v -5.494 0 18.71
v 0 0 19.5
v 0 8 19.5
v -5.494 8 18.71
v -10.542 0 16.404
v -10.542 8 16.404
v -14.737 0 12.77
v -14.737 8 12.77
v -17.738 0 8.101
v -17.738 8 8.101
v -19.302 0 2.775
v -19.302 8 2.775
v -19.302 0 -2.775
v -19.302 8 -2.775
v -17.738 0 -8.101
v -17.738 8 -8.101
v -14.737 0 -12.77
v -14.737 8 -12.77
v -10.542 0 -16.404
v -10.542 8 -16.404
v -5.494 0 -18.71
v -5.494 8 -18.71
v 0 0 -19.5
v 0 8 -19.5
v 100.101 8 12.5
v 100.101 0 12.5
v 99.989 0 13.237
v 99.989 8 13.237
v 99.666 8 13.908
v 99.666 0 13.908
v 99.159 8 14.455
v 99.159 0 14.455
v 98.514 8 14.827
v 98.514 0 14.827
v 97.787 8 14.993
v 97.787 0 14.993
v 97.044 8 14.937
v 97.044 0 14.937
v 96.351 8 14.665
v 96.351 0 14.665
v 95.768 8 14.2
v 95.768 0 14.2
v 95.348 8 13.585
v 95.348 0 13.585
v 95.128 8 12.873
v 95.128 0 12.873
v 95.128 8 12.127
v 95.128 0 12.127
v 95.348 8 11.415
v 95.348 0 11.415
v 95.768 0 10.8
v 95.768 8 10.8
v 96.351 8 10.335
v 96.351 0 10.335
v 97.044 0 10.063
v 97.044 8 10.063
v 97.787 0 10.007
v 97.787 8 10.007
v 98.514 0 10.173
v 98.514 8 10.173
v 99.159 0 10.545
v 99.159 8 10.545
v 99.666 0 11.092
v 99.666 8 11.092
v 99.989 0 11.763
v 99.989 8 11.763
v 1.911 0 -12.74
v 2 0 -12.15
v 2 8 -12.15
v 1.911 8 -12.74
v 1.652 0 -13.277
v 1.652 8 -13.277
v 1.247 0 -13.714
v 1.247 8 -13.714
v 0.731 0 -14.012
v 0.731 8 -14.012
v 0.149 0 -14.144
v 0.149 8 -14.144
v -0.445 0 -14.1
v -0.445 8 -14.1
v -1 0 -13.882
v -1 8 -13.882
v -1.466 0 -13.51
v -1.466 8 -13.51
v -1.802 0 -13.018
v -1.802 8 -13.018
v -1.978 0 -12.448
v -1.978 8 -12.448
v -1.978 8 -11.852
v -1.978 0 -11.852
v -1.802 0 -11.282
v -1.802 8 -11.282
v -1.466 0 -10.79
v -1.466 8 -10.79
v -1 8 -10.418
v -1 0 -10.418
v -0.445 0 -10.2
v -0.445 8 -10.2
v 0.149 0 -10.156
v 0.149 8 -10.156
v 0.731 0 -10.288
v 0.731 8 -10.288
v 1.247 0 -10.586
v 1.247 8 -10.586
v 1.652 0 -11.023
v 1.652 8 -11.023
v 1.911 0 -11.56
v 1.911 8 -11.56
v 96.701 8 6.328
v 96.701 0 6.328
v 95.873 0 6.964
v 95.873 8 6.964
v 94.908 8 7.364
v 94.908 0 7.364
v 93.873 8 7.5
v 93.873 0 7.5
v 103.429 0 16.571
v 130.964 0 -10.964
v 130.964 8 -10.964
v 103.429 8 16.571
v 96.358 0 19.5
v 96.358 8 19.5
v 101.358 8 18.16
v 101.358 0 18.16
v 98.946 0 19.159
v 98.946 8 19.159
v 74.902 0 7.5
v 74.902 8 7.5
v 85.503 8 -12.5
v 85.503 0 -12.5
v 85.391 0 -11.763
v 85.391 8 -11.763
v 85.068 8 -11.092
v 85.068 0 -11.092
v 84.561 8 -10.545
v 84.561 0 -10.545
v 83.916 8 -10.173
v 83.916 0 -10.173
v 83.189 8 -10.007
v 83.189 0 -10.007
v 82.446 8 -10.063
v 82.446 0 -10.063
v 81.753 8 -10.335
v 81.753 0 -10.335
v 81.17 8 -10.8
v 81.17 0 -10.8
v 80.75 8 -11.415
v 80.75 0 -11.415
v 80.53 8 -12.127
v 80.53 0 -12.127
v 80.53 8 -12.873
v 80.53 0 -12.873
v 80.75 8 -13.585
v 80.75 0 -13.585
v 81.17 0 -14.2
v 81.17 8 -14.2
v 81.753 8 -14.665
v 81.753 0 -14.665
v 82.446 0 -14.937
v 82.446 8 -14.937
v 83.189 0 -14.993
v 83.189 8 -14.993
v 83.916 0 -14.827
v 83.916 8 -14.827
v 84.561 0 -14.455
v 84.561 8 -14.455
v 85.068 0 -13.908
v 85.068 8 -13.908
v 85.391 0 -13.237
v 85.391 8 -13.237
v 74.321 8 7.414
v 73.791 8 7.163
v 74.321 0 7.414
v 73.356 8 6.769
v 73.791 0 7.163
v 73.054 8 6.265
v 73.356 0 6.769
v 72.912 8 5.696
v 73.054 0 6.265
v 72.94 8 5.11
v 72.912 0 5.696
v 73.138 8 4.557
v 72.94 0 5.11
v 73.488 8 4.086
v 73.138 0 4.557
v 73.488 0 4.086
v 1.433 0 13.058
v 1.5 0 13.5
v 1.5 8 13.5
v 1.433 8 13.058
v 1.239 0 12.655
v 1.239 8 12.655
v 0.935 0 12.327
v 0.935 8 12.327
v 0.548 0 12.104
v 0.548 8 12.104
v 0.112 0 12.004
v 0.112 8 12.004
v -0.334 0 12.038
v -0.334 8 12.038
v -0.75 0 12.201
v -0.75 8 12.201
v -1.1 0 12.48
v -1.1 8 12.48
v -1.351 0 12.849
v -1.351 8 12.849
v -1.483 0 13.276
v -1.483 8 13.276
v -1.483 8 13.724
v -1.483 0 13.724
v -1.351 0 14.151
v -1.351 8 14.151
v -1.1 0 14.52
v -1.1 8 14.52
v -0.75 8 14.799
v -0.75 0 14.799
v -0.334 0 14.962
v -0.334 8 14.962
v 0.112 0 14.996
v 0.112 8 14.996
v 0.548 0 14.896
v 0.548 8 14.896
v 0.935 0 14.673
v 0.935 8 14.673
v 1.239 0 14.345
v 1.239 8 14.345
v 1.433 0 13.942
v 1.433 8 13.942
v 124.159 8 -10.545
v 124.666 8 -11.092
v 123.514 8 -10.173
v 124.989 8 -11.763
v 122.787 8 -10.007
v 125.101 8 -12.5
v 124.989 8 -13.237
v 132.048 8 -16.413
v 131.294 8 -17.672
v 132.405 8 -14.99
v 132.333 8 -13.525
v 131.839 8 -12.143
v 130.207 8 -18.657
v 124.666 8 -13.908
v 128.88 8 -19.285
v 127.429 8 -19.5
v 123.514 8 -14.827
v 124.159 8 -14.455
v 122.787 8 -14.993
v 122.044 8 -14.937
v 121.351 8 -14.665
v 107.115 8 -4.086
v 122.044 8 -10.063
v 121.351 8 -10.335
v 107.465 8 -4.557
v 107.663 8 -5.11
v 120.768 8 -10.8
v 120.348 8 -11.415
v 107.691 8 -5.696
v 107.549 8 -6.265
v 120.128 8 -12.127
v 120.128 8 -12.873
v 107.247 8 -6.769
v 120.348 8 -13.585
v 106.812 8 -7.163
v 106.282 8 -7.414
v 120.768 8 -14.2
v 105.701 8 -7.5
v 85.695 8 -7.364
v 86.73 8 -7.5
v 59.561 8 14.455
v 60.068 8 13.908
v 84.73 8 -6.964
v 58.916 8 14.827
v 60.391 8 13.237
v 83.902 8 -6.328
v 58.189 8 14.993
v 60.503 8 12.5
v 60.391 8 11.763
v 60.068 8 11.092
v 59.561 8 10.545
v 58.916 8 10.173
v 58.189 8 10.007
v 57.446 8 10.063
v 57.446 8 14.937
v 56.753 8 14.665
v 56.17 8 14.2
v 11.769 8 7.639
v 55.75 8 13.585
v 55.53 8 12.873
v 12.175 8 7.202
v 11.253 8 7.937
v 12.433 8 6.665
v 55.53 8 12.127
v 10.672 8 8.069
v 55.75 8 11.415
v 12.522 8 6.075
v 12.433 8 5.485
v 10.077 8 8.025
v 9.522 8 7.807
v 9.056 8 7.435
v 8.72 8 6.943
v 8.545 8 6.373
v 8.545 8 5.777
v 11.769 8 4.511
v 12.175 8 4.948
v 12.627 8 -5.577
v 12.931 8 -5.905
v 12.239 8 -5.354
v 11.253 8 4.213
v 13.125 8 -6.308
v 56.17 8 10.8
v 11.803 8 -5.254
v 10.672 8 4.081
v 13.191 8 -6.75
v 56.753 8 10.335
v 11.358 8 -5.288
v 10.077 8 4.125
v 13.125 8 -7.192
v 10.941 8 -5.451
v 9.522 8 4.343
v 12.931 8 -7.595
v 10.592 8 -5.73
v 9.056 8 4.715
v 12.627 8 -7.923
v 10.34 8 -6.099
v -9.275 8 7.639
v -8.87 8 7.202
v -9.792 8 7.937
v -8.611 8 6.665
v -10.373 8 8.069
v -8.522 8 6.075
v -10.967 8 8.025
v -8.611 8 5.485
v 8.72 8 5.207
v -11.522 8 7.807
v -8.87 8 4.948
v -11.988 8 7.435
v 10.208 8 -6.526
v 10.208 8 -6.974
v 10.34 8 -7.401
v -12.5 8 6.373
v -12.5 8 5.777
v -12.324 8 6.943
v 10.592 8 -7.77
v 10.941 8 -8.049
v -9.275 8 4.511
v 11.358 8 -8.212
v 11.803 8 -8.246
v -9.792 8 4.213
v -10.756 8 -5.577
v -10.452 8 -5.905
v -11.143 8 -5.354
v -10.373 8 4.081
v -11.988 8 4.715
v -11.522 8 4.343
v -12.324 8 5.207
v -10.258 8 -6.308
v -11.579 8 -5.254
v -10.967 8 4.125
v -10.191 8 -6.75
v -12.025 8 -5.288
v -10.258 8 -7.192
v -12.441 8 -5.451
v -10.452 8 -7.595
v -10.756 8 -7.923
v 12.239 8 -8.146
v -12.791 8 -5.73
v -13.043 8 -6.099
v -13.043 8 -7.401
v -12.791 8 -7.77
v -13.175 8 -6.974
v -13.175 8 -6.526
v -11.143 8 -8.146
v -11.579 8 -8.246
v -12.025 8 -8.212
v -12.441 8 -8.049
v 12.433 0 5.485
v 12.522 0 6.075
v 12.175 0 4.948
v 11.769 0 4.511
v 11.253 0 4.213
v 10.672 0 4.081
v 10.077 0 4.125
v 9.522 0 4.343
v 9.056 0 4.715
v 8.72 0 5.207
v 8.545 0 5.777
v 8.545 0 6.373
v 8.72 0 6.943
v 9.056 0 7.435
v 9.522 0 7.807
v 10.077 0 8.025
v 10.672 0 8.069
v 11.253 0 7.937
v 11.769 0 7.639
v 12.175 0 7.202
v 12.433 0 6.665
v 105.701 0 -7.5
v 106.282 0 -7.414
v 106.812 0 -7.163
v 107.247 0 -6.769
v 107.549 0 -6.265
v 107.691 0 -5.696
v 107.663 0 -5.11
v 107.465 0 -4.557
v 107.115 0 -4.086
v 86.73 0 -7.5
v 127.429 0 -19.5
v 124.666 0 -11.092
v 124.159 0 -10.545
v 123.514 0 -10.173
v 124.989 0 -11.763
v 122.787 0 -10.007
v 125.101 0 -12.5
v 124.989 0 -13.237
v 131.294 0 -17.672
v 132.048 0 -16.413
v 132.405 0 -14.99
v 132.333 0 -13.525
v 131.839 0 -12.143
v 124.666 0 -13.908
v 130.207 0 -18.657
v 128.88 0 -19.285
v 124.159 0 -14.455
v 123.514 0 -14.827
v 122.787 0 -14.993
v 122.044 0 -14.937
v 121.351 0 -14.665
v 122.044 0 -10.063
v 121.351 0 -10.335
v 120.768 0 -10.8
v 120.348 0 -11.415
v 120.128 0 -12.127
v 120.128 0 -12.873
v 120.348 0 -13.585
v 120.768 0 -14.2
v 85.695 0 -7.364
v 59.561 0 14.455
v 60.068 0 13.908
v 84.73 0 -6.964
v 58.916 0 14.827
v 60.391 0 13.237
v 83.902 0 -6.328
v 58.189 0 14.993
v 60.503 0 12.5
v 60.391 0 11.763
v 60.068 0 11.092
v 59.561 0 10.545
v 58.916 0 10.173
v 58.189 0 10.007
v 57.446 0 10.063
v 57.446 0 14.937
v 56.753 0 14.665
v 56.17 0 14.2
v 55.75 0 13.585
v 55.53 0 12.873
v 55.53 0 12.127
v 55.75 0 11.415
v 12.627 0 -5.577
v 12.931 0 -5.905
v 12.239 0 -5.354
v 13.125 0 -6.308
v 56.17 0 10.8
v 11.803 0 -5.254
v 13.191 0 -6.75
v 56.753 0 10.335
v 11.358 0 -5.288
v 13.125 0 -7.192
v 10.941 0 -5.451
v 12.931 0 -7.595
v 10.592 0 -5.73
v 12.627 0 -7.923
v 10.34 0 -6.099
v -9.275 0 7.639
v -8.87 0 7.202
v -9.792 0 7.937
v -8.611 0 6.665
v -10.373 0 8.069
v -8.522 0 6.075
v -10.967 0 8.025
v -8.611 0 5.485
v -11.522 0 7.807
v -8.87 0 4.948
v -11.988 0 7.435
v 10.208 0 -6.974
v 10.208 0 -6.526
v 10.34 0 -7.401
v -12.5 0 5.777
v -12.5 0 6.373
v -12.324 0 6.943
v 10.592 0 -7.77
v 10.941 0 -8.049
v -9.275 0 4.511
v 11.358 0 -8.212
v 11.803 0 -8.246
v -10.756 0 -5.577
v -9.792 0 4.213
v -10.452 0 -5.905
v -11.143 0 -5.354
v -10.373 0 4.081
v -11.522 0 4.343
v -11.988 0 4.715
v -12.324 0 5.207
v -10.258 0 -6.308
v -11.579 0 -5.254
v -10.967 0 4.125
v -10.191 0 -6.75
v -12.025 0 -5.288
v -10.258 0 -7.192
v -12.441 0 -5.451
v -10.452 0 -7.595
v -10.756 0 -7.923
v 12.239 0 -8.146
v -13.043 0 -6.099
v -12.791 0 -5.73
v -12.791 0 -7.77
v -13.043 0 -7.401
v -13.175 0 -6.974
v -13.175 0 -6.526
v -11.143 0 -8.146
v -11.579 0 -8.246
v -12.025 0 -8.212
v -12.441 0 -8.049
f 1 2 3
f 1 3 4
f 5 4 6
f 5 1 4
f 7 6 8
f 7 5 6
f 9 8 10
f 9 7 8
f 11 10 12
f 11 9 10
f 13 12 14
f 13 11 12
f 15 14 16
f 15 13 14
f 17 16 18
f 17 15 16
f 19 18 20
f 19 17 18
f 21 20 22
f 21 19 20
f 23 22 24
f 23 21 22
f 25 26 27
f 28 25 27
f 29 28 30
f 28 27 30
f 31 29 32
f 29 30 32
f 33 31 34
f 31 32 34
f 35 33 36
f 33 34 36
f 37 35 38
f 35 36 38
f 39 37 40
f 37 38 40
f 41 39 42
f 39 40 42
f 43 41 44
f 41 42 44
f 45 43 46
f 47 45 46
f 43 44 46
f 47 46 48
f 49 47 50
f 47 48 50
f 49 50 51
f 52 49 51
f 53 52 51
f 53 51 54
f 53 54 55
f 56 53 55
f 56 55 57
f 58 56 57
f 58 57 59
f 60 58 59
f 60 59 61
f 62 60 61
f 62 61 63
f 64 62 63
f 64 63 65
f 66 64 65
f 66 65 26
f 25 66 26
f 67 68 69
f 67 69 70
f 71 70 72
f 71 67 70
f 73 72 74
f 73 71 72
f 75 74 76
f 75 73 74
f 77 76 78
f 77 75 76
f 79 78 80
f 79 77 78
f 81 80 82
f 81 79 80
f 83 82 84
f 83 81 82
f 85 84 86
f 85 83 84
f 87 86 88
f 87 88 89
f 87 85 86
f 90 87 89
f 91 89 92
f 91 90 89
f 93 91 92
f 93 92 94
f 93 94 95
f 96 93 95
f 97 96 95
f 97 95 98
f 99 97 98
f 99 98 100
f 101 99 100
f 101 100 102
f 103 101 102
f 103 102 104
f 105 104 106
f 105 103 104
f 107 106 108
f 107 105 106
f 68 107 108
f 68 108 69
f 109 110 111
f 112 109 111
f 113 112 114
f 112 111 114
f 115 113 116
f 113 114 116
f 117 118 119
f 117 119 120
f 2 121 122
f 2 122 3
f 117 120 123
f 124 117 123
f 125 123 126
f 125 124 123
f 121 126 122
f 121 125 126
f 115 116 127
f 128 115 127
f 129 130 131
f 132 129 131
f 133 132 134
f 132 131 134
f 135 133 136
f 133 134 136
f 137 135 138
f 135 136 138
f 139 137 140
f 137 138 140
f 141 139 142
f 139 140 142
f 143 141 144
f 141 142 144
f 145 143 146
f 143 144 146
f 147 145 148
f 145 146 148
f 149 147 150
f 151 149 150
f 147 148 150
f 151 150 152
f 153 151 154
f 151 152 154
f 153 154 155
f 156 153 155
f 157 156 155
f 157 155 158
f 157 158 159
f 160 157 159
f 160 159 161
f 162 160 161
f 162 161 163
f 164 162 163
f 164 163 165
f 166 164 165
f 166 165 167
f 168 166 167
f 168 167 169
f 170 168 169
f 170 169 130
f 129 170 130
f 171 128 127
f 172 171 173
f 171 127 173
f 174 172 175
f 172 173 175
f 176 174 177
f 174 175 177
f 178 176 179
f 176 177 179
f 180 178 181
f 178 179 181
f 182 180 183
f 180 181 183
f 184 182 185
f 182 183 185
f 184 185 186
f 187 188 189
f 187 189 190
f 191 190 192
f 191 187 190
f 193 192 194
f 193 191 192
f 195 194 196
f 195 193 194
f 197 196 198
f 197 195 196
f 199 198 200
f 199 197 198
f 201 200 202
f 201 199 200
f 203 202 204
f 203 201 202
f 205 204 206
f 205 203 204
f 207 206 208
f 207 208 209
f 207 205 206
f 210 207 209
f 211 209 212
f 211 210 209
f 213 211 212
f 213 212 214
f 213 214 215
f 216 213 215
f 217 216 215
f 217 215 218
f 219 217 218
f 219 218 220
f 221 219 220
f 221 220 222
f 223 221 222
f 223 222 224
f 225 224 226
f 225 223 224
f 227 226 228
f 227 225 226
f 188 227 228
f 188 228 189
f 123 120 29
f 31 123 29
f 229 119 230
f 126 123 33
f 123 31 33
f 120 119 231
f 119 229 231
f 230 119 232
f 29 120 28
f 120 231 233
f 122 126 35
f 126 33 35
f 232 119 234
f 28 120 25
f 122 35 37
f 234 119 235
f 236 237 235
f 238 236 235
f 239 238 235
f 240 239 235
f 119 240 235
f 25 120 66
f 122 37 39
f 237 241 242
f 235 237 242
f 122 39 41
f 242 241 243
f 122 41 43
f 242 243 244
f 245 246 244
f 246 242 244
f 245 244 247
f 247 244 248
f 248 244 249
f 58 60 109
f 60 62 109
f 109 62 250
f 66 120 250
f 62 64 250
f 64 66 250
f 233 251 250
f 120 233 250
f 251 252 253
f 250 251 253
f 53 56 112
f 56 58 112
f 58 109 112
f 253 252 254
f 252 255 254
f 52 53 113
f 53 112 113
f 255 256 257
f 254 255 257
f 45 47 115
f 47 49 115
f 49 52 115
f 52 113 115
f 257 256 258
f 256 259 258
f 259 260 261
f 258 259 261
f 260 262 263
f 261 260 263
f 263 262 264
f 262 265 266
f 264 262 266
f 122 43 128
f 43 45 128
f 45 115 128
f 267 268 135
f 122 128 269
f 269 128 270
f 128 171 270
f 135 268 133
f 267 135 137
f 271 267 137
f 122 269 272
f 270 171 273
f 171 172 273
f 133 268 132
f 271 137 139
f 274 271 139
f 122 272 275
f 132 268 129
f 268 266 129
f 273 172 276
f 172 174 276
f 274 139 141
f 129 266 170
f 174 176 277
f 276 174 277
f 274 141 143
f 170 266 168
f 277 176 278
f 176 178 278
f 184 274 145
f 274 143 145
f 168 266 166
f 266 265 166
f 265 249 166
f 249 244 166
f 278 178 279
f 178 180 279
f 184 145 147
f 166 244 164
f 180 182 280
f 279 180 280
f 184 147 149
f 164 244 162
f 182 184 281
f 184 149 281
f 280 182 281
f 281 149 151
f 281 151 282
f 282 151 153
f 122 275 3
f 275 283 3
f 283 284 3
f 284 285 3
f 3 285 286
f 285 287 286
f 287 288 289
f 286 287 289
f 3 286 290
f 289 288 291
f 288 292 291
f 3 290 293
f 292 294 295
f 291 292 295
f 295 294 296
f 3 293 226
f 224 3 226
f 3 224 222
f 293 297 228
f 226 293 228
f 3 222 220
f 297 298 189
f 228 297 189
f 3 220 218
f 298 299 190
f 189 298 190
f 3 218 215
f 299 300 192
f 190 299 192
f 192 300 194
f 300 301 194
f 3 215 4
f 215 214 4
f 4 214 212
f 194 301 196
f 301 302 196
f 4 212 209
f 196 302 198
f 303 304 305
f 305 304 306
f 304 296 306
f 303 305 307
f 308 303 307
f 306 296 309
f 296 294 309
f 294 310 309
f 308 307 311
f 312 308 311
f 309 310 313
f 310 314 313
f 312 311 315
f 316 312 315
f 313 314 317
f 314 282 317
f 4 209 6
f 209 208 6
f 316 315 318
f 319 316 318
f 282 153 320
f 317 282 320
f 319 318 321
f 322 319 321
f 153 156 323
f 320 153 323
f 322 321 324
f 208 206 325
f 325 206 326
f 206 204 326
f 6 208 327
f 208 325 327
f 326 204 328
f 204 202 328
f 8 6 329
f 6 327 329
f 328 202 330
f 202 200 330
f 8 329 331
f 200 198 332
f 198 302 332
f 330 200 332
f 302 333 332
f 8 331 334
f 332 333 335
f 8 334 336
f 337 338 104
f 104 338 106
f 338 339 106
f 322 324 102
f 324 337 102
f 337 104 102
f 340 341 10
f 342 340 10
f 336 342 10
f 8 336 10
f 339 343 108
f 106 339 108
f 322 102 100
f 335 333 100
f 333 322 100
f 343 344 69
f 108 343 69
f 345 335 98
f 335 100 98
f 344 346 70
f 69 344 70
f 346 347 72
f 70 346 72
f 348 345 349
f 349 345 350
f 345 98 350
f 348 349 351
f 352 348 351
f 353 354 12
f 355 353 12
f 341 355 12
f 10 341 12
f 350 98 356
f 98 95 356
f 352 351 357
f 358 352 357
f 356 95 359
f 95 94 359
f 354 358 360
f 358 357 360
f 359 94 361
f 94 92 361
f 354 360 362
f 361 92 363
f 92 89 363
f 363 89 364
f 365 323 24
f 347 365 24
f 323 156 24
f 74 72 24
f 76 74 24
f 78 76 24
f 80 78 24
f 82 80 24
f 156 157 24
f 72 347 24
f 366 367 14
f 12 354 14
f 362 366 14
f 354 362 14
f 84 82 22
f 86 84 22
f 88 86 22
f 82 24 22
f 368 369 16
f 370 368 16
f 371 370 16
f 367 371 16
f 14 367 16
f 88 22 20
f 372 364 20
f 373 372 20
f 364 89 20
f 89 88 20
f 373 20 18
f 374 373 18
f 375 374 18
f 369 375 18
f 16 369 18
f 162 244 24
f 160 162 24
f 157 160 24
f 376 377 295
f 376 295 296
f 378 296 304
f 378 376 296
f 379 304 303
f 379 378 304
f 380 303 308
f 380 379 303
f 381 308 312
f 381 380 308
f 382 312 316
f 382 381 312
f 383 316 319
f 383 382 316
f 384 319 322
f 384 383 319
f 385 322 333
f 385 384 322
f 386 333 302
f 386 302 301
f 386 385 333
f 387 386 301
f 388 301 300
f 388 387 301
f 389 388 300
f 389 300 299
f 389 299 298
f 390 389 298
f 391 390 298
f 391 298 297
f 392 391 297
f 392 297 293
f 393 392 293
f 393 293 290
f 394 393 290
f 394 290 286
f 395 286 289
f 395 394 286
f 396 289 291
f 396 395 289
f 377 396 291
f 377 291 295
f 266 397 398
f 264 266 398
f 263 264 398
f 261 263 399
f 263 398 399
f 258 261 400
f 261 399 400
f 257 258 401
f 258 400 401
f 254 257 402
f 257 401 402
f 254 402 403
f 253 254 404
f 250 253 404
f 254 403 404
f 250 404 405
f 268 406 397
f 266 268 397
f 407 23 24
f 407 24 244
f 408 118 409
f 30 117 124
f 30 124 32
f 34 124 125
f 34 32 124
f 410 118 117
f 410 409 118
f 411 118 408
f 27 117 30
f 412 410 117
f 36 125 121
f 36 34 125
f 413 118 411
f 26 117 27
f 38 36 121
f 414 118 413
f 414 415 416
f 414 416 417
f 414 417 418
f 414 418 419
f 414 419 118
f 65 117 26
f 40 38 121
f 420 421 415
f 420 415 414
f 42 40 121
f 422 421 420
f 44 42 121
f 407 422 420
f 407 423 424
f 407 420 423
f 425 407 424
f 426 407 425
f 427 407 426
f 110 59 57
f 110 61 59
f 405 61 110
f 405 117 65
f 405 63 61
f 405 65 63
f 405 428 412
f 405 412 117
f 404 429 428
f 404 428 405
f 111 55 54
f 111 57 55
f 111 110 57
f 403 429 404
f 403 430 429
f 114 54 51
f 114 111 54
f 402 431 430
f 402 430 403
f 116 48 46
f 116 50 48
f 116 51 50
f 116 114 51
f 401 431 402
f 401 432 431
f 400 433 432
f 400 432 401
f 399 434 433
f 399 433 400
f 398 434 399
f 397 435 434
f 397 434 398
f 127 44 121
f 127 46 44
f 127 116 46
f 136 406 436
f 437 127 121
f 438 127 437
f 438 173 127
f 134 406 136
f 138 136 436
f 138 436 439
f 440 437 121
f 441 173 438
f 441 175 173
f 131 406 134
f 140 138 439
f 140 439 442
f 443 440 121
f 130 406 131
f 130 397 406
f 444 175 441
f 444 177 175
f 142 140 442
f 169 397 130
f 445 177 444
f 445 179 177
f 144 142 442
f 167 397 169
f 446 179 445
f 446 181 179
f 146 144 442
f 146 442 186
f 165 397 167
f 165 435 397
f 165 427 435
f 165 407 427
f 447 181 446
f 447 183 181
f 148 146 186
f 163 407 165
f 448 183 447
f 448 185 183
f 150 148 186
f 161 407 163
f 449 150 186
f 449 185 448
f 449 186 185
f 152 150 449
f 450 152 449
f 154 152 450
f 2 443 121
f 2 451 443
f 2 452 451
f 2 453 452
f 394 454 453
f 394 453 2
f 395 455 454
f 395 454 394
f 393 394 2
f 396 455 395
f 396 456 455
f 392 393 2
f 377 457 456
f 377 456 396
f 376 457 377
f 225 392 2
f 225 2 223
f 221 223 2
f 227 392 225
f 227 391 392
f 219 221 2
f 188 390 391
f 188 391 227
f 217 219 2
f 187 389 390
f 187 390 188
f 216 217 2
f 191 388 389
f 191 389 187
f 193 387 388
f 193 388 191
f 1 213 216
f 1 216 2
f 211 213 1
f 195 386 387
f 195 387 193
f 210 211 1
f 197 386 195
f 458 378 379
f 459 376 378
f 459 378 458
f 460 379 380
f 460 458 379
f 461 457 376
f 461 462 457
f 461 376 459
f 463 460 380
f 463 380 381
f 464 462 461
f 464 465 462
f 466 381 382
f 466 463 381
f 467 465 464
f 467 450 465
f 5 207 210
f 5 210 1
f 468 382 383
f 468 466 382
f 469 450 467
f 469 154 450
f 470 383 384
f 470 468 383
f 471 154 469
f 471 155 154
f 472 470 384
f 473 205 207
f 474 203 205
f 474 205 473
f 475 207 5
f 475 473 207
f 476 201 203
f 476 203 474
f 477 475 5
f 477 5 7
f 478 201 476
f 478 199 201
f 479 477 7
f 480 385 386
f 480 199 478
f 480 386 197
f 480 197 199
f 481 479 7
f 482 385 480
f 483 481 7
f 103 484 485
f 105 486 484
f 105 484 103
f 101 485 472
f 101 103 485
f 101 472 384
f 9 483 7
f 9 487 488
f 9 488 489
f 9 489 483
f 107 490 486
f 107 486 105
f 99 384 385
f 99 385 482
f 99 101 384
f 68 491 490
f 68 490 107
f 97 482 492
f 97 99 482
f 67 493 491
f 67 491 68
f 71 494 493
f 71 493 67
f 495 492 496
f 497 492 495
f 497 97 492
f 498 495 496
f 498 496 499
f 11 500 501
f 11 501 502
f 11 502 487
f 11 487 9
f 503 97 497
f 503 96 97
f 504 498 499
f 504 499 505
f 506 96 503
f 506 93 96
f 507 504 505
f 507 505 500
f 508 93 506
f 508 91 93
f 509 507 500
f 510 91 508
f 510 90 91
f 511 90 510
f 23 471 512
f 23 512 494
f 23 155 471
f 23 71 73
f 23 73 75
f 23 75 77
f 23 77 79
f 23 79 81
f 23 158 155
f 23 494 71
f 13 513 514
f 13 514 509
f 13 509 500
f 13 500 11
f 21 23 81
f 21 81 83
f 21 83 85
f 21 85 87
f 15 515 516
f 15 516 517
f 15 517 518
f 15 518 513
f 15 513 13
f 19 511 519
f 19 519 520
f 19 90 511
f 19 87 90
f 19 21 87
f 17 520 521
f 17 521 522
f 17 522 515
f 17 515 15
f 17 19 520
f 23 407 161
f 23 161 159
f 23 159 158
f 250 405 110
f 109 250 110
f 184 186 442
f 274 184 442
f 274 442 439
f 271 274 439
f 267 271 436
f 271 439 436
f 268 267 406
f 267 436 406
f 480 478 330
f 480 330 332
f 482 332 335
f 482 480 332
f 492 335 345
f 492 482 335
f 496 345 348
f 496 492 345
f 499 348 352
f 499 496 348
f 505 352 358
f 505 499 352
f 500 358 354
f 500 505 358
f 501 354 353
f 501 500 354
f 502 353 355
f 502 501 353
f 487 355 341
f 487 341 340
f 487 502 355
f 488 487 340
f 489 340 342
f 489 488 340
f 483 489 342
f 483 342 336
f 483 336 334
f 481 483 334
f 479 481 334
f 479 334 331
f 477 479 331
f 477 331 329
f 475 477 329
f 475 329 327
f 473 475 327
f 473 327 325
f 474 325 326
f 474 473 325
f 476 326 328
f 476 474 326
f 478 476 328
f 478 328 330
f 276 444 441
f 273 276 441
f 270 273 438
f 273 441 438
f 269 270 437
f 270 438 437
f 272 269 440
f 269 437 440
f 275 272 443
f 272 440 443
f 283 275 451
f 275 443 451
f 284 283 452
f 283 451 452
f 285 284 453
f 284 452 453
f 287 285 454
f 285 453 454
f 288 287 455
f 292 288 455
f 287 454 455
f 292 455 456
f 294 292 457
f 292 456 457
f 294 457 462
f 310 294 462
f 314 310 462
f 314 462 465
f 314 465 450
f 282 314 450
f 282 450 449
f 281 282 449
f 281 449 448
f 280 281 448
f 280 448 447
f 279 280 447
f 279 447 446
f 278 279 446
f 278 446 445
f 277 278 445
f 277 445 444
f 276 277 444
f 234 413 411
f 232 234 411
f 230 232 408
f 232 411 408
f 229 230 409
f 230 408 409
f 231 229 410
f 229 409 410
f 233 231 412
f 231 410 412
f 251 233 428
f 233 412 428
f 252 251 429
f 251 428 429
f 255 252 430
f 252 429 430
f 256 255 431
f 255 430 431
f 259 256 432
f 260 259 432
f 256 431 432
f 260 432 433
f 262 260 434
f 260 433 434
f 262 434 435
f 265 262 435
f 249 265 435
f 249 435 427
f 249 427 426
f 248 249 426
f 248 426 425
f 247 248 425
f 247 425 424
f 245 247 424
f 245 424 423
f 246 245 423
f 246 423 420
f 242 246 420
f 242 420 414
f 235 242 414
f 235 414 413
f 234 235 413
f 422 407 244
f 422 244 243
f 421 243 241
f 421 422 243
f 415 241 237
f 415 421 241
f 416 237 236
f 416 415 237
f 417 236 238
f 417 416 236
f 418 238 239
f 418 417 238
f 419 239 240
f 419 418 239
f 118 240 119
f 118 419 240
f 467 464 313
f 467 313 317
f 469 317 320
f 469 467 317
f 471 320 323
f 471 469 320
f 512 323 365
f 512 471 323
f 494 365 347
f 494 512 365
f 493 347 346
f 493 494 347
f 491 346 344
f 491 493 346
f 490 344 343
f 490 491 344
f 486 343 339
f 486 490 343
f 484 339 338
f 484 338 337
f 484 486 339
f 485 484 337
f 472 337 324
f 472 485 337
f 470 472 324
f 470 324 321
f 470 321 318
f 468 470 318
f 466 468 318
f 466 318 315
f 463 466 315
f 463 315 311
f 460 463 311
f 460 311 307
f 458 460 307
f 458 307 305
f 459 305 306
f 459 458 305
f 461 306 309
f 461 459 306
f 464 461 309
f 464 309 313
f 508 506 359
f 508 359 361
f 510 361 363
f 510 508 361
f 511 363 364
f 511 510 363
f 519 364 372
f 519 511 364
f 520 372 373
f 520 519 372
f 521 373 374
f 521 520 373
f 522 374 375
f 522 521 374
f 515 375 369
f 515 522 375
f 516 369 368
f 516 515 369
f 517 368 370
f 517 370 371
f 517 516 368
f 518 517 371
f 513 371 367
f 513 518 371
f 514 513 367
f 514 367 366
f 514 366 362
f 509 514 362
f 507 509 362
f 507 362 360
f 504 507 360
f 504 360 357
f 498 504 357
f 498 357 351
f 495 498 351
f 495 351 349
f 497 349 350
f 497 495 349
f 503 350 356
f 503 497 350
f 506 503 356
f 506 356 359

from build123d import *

# Parameters (mm, degrees)
SKETCH_1_R               = 2
SKETCH_1_R_2             = 1.5
EXTRUDE_1_DEPTH          = 8
CUT_EXTRUDE_1_DEPTH      = 9
SKETCH_3_R               = 2.5
CUT_EXTRUDE_2_DEPTH      = 1
CUT_EXTRUDE_2_DEPTH_BACK = 9


with BuildPart() as part:
    # 草图1 → 凸台-拉伸1 (new body)
    with BuildSketch(Plane(origin=(0, 0, 0), x_dir=(1, 0, 0), z_dir=(0, 1, 0))):
        with BuildLine():
            Line((0, 19.5), (127.428932188, 19.5))
            ThreePointArc((127.428932188, 19.5), (132.048329851, 16.413417162), (130.964466094, 10.964466094))
            Line((130.964466094, 10.964466094), (103.428932188, -16.571067812))
            ThreePointArc((103.428932188, -16.571067812), (100.1846987, -18.738795325), (96.357864376, -19.5))
            Line((96.357864376, -19.5), (0, -19.5))
            ThreePointArc((0, -19.5), (-19.5, 0), (0, 19.5))
        make_face()
        with Locations((0, 12.15)):
            Circle(SKETCH_1_R, mode=Mode.SUBTRACT)
        with Locations((-10.522208656, -6.075)):
            Circle(SKETCH_1_R, mode=Mode.SUBTRACT)
        with Locations((10.522208656, -6.075)):
            Circle(SKETCH_1_R, mode=Mode.SUBTRACT)
        with Locations((-11.691342951, 6.75)):
            Circle(SKETCH_1_R_2, mode=Mode.SUBTRACT)
        with Locations((11.691342951, 6.75)):
            Circle(SKETCH_1_R_2, mode=Mode.SUBTRACT)
        with Locations((0, -13.5)):
            Circle(SKETCH_1_R_2, mode=Mode.SUBTRACT)
    extrude(amount=EXTRUDE_1_DEPTH)

    # 草图2 → 切除-拉伸1 (cut, through all)
    with BuildSketch(Plane.XZ):
        with BuildLine():
            Line((93.872583002, 7.5), (74.902020254, 7.5))
            ThreePointArc((74.902020254, 7.5), (73.054261189, 6.265366865), (73.487806691, 4.085786438))
            Line((73.487806691, 4.085786438), (83.902020254, -6.328427125))
            ThreePointArc((83.902020254, -6.328427125), (85.199713649, -7.19551813), (86.730447378, -7.5))
            Line((86.730447378, -7.5), (105.701010127, -7.5))
            ThreePointArc((105.701010127, -7.5), (107.548769192, -6.265366865), (107.115223689, -4.085786438))
            Line((107.115223689, -4.085786438), (96.701010127, 6.328427125))
            ThreePointArc((96.701010127, 6.328427125), (95.403316731, 7.19551813), (93.872583002, 7.5))
        make_face()
    extrude(amount=-CUT_EXTRUDE_1_DEPTH, mode=Mode.SUBTRACT)

    # 草图3 → 切除-拉伸2 (cut, two sides)
    with BuildSketch(Plane.XZ) as cut_extrude_2_sk:
        with Locations((97.600505063, 12.5)):
            Circle(SKETCH_3_R)
        with Locations((122.600505063, -12.5)):
            Circle(SKETCH_3_R)
        with Locations((83.002525317, -12.5)):
            Circle(SKETCH_3_R)
        with Locations((58.002525317, 12.5)):
            Circle(SKETCH_3_R)
    extrude(amount=CUT_EXTRUDE_2_DEPTH, mode=Mode.SUBTRACT)
    extrude(cut_extrude_2_sk.sketch, amount=-CUT_EXTRUDE_2_DEPTH_BACK, mode=Mode.SUBTRACT)


solid = part.part
